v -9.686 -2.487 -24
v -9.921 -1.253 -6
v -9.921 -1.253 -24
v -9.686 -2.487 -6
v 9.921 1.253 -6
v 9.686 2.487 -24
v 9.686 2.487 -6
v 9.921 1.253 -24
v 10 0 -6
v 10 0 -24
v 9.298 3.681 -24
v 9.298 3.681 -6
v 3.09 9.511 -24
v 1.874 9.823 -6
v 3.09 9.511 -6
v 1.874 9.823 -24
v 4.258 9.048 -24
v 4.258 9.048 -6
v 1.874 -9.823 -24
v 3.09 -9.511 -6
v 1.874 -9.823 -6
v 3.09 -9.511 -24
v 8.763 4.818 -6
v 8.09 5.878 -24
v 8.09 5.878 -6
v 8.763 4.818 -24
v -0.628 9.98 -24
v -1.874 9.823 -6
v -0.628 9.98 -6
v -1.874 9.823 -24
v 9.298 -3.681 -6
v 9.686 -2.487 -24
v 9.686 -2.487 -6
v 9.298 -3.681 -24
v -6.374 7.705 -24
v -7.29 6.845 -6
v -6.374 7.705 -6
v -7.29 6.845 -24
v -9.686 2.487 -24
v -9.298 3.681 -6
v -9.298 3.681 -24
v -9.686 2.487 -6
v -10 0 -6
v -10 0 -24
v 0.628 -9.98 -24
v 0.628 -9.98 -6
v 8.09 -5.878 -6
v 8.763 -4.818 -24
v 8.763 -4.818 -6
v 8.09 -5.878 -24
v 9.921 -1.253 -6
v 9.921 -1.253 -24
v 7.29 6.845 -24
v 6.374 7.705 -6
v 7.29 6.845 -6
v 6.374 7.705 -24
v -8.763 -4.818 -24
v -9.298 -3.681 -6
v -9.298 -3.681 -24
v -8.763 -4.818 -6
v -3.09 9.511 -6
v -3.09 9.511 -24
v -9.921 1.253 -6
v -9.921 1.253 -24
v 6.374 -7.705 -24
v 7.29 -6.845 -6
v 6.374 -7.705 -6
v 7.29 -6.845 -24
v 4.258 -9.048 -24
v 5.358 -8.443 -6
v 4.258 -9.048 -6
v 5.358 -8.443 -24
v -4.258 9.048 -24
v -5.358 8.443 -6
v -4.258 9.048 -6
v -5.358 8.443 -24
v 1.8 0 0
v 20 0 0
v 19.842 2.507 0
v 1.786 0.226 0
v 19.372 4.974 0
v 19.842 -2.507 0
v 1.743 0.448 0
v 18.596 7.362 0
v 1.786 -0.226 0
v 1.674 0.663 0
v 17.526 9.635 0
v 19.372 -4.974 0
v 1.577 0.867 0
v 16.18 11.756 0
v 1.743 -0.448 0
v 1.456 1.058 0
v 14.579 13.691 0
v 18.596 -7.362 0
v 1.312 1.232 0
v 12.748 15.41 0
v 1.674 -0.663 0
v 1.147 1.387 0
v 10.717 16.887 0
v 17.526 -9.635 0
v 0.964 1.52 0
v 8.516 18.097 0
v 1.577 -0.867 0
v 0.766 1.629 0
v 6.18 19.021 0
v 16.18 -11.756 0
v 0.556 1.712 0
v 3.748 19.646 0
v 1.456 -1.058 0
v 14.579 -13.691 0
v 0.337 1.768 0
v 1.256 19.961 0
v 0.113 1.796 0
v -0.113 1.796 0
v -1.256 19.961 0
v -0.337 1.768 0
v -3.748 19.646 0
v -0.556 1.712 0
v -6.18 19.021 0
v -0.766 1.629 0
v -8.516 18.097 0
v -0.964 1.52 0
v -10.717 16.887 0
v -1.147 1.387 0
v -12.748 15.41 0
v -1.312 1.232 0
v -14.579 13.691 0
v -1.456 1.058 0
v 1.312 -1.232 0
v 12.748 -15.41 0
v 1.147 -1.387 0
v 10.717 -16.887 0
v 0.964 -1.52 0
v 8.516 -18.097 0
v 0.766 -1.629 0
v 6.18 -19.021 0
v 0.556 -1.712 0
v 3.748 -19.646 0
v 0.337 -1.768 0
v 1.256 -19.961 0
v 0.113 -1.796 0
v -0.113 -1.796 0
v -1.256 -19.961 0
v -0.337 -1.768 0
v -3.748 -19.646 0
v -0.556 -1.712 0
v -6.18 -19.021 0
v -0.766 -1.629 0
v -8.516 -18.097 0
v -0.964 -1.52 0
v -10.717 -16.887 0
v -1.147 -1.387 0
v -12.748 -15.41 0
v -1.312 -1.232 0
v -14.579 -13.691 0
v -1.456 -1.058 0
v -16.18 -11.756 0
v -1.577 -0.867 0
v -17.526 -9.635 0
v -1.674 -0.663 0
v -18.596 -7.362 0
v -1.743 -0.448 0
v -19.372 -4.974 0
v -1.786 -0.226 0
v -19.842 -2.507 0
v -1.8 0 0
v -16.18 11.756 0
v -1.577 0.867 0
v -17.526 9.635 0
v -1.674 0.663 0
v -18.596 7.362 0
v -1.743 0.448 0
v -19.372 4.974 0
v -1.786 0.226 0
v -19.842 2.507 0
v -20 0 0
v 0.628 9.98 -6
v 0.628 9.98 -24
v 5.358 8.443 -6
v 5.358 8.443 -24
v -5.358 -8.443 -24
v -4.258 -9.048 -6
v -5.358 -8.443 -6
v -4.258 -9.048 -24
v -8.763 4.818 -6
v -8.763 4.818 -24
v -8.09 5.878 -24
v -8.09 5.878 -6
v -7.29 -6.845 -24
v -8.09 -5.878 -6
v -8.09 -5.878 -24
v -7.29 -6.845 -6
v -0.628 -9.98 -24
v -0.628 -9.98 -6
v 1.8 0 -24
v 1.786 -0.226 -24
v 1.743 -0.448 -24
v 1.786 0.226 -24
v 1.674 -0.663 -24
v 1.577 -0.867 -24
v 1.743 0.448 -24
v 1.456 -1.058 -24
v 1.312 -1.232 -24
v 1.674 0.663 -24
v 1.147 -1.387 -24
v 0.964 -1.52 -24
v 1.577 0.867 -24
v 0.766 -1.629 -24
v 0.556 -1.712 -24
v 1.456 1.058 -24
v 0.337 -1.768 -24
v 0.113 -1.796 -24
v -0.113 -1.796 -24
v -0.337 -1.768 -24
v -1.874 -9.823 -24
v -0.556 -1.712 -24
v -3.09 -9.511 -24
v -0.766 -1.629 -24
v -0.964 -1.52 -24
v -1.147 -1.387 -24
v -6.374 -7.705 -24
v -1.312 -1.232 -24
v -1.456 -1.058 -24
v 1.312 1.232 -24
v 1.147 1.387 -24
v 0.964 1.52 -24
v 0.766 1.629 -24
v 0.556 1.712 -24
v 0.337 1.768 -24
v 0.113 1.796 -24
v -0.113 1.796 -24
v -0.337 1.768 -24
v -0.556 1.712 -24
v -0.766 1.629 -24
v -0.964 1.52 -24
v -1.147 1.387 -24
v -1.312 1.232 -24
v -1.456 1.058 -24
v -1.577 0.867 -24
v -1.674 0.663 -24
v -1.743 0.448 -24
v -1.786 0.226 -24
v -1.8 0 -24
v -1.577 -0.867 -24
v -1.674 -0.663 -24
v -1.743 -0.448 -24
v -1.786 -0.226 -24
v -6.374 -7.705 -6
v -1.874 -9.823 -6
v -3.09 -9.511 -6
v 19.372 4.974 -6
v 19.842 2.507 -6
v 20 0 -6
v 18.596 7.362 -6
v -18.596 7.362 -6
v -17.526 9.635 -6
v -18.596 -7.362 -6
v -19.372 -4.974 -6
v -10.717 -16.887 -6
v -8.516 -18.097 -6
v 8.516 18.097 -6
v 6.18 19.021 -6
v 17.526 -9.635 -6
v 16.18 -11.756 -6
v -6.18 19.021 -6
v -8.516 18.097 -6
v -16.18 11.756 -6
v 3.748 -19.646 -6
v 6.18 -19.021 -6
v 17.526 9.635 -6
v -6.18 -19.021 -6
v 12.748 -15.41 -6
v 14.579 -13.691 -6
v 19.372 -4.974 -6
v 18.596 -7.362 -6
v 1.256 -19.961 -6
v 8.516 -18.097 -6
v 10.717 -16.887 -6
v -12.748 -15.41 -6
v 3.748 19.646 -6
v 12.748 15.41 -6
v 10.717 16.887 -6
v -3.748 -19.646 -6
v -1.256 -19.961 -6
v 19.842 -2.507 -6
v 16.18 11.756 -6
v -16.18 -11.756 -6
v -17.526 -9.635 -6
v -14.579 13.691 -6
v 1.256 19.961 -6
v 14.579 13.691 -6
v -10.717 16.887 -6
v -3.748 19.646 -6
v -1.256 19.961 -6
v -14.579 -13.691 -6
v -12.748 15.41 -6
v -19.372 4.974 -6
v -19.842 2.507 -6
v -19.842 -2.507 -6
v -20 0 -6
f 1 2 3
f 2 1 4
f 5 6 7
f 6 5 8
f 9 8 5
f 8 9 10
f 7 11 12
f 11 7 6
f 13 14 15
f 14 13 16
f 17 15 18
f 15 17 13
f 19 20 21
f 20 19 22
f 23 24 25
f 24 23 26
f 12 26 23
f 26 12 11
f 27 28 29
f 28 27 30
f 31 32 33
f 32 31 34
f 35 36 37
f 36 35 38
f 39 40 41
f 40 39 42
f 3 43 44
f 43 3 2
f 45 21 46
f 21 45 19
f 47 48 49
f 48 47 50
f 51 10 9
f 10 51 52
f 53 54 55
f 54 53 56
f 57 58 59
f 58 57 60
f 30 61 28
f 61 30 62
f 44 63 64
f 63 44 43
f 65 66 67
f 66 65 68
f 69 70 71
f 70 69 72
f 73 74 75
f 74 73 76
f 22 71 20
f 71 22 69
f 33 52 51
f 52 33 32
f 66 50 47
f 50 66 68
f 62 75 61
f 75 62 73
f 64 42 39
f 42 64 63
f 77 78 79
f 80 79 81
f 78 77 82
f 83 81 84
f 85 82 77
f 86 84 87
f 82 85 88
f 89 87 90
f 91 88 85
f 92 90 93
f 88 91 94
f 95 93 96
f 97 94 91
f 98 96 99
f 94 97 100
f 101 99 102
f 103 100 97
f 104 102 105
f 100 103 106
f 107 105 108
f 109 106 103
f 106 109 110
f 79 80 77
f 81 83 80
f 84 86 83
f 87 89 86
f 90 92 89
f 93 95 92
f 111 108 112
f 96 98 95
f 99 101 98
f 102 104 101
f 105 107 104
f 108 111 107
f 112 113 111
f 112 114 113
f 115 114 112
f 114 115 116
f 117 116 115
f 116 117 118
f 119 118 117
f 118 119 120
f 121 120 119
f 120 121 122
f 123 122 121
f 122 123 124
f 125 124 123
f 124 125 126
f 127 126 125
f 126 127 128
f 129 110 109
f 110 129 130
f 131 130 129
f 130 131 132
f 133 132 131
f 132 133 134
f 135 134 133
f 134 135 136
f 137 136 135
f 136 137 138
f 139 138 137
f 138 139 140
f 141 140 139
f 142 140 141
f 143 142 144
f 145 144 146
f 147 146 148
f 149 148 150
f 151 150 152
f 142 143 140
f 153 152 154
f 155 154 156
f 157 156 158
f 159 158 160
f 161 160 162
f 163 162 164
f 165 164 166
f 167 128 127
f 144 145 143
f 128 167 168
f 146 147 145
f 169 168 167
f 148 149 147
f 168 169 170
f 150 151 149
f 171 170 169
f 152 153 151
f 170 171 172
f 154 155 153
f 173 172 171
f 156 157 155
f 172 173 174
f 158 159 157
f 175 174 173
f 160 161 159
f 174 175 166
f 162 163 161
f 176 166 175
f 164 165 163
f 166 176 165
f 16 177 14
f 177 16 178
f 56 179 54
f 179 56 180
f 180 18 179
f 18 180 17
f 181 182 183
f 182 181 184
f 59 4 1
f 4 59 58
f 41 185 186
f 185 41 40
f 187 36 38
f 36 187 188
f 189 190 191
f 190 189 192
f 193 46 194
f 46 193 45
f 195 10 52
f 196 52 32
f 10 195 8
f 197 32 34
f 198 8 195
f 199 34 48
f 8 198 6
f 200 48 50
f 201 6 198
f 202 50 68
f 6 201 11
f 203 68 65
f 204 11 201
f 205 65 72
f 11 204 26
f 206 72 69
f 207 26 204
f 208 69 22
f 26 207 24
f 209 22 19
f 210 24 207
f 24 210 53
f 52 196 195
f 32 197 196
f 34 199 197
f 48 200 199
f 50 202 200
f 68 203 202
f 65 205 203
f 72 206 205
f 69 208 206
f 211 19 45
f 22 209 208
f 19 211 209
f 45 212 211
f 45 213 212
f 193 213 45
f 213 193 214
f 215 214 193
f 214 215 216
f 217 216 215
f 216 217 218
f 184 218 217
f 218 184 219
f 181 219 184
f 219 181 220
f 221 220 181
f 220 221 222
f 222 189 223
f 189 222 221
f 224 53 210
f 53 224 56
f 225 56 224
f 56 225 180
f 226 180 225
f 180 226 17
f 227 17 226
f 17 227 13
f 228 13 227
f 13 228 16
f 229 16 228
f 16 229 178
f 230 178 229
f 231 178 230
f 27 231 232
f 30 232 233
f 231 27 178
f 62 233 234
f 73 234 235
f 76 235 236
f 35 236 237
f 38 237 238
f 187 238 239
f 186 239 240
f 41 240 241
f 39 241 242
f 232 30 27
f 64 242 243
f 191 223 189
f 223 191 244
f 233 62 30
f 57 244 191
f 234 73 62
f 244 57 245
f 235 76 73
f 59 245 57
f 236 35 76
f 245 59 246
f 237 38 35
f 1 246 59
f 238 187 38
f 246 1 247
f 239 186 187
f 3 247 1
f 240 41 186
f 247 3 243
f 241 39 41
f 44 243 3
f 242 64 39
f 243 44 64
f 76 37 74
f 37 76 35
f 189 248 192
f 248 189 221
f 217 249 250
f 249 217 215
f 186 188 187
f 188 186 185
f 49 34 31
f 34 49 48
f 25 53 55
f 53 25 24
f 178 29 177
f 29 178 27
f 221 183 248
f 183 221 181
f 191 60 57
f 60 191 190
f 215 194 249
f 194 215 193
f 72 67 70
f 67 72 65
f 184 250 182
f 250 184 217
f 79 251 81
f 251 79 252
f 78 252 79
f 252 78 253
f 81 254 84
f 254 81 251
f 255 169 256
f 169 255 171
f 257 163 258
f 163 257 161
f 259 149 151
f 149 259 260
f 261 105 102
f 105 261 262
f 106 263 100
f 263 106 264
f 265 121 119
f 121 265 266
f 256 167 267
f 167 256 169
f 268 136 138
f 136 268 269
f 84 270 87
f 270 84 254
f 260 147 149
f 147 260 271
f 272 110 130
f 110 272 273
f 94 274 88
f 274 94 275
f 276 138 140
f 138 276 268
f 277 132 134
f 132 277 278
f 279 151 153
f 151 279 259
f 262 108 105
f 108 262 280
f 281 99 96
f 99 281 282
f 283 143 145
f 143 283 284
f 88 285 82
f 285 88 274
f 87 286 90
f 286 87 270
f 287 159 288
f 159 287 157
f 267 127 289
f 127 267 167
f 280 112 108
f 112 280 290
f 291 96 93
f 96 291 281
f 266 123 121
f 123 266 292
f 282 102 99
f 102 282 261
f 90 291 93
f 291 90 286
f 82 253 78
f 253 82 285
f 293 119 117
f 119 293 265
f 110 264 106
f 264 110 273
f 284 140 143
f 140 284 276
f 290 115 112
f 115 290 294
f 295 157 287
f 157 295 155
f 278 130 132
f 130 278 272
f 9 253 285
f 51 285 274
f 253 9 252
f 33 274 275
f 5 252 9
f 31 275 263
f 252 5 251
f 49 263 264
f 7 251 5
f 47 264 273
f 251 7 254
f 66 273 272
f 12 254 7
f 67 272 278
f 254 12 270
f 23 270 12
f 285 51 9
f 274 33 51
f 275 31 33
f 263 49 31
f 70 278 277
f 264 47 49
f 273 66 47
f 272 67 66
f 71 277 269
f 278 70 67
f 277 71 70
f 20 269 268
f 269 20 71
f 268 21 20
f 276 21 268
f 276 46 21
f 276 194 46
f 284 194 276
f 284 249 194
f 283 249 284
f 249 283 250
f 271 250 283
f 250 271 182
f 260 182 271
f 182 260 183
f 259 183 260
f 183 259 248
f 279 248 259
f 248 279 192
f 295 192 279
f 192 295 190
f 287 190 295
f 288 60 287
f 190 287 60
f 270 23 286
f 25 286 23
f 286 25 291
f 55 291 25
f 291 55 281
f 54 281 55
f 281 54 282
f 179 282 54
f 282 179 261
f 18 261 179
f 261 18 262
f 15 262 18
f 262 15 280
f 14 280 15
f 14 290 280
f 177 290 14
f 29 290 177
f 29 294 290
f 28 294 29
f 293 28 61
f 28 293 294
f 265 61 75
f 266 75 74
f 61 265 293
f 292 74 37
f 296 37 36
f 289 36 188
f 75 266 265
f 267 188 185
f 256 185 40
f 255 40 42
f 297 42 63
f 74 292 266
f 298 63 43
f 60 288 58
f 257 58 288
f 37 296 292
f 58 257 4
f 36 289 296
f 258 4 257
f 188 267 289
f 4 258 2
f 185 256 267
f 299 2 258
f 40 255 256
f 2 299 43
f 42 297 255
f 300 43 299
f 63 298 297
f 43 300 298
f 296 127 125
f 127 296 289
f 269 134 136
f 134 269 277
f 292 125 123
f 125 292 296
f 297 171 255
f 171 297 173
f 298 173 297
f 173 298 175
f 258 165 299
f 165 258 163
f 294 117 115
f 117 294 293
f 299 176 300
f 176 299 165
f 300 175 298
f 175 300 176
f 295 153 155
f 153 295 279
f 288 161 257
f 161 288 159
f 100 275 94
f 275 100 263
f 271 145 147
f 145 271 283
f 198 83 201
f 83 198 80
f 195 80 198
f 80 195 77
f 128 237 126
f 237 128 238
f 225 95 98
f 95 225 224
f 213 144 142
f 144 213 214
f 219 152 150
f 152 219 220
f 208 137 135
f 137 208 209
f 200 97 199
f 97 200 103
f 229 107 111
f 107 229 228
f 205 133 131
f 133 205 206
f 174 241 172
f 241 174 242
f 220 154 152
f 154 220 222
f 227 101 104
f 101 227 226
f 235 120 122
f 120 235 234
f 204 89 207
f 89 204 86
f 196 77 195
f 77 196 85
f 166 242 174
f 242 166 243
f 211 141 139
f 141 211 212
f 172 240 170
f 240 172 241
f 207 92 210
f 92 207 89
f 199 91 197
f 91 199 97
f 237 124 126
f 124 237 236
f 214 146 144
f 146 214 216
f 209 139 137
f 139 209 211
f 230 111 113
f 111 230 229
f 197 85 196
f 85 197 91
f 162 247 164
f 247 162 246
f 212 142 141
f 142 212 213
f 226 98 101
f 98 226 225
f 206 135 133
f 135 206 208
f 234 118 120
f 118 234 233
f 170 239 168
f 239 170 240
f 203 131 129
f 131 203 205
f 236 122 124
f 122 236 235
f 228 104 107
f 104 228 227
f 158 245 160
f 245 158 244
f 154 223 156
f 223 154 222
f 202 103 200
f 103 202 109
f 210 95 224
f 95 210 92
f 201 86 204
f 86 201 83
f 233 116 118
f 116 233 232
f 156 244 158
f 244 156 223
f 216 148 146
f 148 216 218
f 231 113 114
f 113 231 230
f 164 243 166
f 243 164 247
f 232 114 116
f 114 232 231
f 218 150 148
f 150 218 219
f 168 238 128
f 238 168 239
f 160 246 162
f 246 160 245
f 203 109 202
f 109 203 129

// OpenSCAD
$fn = 50;


difference() {
	union() {
		translate(v = [0, 0, -24.0000000000]) {
			cylinder(h = 24, r = 10.0000000000);
		}
		translate(v = [0, 0, -6.0000000000]) {
			cylinder(h = 6, r = 20.0000000000);
		}
	}
	union() {
		#translate(v = [0, 0, -24]) {
			cylinder(h = 24, r = 1.8000000000);
		}
	}
}
